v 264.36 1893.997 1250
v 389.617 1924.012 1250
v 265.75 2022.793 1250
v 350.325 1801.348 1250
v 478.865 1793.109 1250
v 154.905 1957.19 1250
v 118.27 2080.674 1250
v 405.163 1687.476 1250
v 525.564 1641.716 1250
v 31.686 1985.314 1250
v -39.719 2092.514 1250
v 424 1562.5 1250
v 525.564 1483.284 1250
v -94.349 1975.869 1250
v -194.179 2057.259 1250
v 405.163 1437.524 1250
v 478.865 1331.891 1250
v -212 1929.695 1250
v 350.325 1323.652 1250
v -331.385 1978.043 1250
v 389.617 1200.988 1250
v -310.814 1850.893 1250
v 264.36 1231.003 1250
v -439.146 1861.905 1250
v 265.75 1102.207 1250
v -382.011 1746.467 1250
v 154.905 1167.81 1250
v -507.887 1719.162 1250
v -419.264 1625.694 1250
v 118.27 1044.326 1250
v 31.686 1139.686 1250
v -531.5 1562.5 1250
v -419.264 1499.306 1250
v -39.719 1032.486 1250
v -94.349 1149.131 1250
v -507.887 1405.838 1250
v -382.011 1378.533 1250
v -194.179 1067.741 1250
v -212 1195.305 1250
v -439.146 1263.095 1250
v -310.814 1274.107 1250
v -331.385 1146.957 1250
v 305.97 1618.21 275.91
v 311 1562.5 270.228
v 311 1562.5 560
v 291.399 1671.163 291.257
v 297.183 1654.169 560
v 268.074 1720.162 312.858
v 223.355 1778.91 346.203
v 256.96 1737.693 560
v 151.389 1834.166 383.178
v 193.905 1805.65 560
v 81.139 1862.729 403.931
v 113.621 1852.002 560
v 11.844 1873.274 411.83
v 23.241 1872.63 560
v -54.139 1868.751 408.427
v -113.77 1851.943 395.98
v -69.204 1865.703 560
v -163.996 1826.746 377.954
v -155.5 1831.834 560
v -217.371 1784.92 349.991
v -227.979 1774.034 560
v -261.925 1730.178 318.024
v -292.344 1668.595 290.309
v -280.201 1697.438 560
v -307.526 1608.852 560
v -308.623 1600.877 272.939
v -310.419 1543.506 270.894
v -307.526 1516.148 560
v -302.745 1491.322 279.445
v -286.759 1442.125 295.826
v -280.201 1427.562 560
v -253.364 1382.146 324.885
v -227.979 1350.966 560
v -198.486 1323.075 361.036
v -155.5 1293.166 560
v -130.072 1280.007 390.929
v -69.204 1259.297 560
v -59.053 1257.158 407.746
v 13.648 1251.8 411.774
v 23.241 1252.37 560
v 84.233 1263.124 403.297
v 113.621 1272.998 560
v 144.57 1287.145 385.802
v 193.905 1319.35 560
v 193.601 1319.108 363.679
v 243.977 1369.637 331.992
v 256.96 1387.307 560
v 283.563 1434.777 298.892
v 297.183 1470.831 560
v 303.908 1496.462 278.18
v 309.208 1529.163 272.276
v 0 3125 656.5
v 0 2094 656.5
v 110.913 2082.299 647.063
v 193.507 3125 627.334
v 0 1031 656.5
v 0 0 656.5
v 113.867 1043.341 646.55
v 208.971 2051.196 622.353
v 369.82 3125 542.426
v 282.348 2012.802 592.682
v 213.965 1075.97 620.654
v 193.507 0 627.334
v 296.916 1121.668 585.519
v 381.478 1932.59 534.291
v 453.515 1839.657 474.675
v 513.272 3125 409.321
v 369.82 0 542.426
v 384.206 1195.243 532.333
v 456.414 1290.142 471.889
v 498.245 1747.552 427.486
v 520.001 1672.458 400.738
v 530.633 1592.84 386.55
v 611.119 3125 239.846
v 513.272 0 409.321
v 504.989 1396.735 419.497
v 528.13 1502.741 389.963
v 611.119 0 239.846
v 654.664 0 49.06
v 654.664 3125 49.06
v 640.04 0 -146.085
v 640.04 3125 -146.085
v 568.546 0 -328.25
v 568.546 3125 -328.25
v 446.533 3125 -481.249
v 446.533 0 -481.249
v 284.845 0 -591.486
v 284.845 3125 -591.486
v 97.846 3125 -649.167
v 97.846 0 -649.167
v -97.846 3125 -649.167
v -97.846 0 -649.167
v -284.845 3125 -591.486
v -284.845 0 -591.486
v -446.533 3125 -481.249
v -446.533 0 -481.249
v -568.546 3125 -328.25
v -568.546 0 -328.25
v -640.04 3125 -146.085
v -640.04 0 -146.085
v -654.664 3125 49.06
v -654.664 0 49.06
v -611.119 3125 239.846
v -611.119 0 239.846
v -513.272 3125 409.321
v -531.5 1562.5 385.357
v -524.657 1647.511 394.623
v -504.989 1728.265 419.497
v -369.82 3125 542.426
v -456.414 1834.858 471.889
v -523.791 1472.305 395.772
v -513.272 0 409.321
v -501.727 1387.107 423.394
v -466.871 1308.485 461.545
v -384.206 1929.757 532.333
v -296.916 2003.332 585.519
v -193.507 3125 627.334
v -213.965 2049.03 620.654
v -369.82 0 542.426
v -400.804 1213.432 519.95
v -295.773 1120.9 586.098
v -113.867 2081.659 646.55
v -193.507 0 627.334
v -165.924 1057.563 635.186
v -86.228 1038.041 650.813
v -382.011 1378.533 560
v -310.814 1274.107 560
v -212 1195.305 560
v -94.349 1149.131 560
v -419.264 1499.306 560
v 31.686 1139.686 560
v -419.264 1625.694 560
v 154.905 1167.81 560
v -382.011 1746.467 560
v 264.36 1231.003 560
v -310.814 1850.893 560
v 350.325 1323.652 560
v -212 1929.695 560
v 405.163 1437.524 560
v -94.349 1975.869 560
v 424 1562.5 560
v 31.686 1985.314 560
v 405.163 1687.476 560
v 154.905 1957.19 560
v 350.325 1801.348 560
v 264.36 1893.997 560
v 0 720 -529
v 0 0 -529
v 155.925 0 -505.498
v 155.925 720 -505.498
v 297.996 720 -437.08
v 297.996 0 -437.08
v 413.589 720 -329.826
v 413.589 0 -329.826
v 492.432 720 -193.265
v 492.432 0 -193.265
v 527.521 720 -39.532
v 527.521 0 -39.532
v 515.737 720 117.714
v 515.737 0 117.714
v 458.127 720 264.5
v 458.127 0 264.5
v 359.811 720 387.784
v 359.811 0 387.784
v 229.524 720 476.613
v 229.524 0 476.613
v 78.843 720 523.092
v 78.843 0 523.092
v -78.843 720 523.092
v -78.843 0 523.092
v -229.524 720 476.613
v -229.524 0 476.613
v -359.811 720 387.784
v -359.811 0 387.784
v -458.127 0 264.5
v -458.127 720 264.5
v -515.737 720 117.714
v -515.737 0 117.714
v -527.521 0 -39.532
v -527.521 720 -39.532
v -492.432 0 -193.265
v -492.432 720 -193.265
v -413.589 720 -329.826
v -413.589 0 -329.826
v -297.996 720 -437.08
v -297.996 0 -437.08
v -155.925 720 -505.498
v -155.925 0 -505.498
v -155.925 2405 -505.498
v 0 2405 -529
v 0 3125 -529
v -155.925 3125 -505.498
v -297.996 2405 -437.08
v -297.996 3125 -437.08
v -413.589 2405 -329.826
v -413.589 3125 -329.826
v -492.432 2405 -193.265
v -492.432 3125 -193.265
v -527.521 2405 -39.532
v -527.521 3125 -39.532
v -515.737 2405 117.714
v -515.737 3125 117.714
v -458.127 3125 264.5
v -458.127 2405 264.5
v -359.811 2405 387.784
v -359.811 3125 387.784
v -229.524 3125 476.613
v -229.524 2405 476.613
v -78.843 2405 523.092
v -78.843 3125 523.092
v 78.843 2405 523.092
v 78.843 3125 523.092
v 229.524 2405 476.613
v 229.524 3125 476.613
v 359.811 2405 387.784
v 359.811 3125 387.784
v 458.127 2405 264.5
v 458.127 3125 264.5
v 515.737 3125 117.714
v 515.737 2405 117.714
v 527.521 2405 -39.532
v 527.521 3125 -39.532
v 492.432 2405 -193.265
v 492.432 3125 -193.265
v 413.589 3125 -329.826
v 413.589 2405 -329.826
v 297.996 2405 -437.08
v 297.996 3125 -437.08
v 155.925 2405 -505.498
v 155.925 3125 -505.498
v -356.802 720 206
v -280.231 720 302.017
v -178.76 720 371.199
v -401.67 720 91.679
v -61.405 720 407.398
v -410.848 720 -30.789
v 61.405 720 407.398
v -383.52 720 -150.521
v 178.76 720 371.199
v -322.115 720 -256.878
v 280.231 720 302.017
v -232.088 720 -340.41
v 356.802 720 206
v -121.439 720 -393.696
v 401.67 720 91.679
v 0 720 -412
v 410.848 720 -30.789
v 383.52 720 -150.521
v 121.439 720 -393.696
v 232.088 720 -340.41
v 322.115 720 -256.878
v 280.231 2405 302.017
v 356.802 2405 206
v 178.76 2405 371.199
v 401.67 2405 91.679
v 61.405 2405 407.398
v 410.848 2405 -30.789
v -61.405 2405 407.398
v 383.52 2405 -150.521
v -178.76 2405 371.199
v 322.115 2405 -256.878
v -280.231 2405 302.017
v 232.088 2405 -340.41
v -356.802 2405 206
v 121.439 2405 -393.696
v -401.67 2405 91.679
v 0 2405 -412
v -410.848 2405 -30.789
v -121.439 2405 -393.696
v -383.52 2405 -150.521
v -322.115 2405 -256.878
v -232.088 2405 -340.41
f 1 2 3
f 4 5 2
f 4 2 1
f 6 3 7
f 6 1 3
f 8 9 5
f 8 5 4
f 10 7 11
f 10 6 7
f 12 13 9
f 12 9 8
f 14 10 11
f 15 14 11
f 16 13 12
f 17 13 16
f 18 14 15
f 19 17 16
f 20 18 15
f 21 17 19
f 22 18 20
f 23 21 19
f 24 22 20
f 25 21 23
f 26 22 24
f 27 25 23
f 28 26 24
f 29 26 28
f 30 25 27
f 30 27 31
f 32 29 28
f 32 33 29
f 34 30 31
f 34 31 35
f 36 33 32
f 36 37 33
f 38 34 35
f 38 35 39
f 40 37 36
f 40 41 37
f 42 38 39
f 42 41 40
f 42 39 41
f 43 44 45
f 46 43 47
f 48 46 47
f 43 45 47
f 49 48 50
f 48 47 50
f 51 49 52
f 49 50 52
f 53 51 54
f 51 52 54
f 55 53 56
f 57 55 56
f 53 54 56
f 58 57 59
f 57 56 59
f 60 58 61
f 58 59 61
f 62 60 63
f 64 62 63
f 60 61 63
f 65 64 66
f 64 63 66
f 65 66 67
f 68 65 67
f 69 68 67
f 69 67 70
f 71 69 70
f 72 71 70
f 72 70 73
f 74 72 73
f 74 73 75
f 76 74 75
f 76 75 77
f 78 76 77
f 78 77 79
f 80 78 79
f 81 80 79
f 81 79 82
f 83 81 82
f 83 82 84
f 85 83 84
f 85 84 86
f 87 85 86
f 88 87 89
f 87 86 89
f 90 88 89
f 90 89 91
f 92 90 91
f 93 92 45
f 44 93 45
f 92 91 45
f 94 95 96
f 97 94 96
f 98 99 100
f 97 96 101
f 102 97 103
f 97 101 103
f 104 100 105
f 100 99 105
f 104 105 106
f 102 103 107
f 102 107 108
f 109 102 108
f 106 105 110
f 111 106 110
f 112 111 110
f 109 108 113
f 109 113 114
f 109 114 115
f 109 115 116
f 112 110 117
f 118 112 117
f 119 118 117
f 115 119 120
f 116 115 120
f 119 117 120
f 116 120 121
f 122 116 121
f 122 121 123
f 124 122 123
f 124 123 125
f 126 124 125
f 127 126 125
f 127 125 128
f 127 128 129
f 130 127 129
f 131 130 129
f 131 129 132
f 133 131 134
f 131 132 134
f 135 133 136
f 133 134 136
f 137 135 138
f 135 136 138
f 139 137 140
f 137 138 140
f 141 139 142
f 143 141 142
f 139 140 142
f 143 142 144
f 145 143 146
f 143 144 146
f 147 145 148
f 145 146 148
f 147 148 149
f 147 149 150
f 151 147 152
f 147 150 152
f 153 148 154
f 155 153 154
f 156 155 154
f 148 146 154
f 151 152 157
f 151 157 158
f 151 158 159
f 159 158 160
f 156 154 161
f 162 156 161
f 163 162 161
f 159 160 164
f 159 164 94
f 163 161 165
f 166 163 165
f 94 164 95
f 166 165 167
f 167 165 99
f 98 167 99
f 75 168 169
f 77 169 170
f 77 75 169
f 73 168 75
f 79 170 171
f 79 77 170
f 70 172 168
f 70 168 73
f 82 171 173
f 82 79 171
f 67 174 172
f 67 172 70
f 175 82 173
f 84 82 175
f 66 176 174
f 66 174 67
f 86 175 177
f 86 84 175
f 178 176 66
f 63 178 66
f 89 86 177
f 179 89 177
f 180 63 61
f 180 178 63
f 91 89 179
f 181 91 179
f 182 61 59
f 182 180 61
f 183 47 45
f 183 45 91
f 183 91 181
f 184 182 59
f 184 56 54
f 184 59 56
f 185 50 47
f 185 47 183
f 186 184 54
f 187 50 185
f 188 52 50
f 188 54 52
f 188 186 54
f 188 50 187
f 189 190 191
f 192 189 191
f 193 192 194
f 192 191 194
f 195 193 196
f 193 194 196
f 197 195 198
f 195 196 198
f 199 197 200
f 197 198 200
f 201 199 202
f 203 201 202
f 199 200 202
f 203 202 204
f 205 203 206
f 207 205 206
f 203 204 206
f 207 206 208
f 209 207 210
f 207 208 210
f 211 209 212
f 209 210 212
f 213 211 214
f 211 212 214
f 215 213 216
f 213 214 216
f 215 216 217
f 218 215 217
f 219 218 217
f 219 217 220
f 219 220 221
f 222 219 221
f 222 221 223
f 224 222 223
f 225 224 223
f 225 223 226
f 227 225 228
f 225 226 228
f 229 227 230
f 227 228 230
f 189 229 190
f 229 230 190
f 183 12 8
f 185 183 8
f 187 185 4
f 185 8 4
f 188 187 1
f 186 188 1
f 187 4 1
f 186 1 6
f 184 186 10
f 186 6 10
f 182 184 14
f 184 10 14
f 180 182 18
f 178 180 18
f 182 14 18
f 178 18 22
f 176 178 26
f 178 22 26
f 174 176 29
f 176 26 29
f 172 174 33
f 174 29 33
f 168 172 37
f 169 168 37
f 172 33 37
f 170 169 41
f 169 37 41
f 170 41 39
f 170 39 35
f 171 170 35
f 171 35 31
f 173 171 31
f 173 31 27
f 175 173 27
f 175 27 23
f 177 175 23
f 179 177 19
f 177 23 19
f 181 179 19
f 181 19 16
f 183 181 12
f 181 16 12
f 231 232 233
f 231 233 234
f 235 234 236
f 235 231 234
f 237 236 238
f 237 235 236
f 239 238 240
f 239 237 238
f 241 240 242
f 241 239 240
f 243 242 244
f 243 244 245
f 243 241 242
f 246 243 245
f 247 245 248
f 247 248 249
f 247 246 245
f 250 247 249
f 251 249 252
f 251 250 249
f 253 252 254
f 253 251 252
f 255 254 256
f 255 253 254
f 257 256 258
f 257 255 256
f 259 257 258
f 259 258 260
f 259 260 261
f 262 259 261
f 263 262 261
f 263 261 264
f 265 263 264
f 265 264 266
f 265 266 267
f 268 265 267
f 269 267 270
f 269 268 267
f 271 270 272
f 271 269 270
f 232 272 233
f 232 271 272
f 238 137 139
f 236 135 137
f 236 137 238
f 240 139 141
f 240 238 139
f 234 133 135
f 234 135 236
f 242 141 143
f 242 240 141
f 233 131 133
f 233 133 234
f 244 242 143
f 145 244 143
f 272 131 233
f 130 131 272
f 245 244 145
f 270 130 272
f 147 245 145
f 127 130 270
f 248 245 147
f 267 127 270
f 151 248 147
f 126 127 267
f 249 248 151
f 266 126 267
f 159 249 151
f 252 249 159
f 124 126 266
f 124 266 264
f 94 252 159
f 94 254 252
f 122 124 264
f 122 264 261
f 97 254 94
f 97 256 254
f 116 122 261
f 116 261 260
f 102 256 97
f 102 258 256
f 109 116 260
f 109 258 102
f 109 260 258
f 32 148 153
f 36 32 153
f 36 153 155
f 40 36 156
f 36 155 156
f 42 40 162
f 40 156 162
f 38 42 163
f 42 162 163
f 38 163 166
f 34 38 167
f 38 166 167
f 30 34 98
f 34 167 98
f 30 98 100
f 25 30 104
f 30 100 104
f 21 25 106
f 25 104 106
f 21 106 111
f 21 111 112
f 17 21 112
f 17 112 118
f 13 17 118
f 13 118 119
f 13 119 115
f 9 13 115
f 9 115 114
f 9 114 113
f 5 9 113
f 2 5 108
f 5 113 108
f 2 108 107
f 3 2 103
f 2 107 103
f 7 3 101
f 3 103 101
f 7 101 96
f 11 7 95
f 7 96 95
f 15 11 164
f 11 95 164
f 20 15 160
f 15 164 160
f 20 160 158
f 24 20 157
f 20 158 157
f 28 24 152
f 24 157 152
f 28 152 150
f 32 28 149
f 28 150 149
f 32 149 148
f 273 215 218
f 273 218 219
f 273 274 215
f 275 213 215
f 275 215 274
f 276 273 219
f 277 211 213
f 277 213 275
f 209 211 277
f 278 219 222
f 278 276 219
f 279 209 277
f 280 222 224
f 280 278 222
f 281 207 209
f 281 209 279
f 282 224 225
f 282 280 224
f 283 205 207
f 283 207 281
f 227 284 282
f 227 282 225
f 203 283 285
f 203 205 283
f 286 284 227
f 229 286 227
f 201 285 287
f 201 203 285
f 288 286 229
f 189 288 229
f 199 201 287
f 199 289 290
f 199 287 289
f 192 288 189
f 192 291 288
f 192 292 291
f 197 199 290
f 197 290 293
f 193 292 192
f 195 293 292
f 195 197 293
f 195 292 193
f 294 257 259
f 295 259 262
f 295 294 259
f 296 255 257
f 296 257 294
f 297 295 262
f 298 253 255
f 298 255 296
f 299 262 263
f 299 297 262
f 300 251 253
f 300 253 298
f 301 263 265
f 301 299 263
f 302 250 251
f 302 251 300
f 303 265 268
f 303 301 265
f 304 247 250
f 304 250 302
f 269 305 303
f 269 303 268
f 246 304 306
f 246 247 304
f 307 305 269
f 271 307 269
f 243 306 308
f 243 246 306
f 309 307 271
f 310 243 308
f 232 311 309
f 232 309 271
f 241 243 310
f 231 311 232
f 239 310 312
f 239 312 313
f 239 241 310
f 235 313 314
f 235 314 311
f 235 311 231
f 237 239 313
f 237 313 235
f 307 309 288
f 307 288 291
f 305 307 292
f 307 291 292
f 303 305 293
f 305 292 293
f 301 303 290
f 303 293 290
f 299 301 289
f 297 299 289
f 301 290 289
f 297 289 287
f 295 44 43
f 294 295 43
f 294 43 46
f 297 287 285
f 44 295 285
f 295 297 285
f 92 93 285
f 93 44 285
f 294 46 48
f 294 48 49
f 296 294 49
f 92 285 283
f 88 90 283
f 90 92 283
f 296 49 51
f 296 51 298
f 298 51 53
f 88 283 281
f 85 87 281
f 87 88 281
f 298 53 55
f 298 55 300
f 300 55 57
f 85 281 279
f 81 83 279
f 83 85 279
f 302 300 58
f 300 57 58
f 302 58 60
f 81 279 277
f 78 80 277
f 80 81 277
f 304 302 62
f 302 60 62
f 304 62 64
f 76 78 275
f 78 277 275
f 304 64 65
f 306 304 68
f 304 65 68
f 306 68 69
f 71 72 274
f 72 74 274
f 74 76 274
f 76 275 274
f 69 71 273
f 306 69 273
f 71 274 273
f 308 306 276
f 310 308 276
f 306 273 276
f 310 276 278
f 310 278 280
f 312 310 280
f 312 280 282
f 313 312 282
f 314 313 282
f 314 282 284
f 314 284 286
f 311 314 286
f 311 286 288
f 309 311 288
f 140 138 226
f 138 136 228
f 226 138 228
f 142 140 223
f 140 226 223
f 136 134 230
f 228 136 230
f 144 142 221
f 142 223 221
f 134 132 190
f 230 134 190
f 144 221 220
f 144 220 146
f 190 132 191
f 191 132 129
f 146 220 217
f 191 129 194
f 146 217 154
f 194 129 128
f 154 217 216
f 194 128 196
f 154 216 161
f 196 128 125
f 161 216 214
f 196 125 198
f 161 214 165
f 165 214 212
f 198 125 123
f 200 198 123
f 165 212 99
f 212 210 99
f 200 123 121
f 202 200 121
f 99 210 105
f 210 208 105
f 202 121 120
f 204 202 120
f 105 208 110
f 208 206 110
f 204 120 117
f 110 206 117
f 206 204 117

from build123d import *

# Parameters (mm, degrees)
SKETCH1_R           = 656.5
BOSS_EXTRUDE1_DEPTH = 3125
SKETCH2_R           = 531.5
BOSS_EXTRUDE2_DEPTH = 1250
SKETCH3_R           = 424
CUT_EXTRUDE1_DEPTH  = 690
SKETCH4_R           = 311
CUT_EXTRUDE2_DEPTH  = 560
SKETCH5_R           = 529
CUT_EXTRUDE3_DEPTH  = 720
SKETCH6_R           = 412
CUT_EXTRUDE4_DEPTH  = 2789.820046339
CUT_EXTRUDE5_START  = -720
SKETCH7_R           = 529
CUT_EXTRUDE5_DEPTH  = 720


with BuildPart() as part:
    # Sketch1 → Boss-Extrude1 (new body)
    with BuildSketch(Plane(origin=(0, 0, 0), x_dir=(1, 0, 0), z_dir=(0, 1, 0))):
        with Locations(Location((0, 0, 0), (0, 0, 270))):
            Circle(SKETCH1_R)
    extrude(amount=BOSS_EXTRUDE1_DEPTH)

    # Sketch2 → Boss-Extrude2 (add)
    with BuildSketch(Plane.XY):
        with Locations(Location((0, 1562.5, 0), (0, 0, 180))):
            Circle(SKETCH2_R)
    extrude(amount=BOSS_EXTRUDE2_DEPTH)

    # Sketch3 → Cut-Extrude1 (cut)
    with BuildSketch(Plane.XY.offset(1250)):
        with Locations((0, 1562.5)):
            Circle(SKETCH3_R)
    extrude(amount=-CUT_EXTRUDE1_DEPTH, mode=Mode.SUBTRACT)

    # Sketch4 → Cut-Extrude2 (cut)
    with BuildSketch(Plane.XY.offset(560)):
        with Locations((0, 1562.5)):
            Circle(SKETCH4_R)
    extrude(amount=-CUT_EXTRUDE2_DEPTH, mode=Mode.SUBTRACT)

    # Sketch5 → Cut-Extrude3 (cut)
    with BuildSketch(Plane.XZ):
        with Locations(Location((0, 0, 0), (0, 0, 270))):
            Circle(SKETCH5_R)
    extrude(amount=-CUT_EXTRUDE3_DEPTH, mode=Mode.SUBTRACT)

    # Sketch6 → Cut-Extrude4 (cut, through all)
    with BuildSketch(Plane.XZ.offset(-720)):
        with Locations(Location((0, 0, 0), (0, 0, 270))):
            Circle(SKETCH6_R)
    extrude(amount=-CUT_EXTRUDE4_DEPTH, mode=Mode.SUBTRACT)

    # Sketch7 → Cut-Extrude5 (cut)
    with BuildSketch(Plane(origin=(0, 3125, 0), x_dir=(1, 0, 0), z_dir=(0, 1, 0)).offset(CUT_EXTRUDE5_START)):
        with Locations(Location((0, 0, 0), (0, 0, 90))):
            Circle(SKETCH7_R)
    extrude(amount=CUT_EXTRUDE5_DEPTH, mode=Mode.SUBTRACT)


solid = part.part
